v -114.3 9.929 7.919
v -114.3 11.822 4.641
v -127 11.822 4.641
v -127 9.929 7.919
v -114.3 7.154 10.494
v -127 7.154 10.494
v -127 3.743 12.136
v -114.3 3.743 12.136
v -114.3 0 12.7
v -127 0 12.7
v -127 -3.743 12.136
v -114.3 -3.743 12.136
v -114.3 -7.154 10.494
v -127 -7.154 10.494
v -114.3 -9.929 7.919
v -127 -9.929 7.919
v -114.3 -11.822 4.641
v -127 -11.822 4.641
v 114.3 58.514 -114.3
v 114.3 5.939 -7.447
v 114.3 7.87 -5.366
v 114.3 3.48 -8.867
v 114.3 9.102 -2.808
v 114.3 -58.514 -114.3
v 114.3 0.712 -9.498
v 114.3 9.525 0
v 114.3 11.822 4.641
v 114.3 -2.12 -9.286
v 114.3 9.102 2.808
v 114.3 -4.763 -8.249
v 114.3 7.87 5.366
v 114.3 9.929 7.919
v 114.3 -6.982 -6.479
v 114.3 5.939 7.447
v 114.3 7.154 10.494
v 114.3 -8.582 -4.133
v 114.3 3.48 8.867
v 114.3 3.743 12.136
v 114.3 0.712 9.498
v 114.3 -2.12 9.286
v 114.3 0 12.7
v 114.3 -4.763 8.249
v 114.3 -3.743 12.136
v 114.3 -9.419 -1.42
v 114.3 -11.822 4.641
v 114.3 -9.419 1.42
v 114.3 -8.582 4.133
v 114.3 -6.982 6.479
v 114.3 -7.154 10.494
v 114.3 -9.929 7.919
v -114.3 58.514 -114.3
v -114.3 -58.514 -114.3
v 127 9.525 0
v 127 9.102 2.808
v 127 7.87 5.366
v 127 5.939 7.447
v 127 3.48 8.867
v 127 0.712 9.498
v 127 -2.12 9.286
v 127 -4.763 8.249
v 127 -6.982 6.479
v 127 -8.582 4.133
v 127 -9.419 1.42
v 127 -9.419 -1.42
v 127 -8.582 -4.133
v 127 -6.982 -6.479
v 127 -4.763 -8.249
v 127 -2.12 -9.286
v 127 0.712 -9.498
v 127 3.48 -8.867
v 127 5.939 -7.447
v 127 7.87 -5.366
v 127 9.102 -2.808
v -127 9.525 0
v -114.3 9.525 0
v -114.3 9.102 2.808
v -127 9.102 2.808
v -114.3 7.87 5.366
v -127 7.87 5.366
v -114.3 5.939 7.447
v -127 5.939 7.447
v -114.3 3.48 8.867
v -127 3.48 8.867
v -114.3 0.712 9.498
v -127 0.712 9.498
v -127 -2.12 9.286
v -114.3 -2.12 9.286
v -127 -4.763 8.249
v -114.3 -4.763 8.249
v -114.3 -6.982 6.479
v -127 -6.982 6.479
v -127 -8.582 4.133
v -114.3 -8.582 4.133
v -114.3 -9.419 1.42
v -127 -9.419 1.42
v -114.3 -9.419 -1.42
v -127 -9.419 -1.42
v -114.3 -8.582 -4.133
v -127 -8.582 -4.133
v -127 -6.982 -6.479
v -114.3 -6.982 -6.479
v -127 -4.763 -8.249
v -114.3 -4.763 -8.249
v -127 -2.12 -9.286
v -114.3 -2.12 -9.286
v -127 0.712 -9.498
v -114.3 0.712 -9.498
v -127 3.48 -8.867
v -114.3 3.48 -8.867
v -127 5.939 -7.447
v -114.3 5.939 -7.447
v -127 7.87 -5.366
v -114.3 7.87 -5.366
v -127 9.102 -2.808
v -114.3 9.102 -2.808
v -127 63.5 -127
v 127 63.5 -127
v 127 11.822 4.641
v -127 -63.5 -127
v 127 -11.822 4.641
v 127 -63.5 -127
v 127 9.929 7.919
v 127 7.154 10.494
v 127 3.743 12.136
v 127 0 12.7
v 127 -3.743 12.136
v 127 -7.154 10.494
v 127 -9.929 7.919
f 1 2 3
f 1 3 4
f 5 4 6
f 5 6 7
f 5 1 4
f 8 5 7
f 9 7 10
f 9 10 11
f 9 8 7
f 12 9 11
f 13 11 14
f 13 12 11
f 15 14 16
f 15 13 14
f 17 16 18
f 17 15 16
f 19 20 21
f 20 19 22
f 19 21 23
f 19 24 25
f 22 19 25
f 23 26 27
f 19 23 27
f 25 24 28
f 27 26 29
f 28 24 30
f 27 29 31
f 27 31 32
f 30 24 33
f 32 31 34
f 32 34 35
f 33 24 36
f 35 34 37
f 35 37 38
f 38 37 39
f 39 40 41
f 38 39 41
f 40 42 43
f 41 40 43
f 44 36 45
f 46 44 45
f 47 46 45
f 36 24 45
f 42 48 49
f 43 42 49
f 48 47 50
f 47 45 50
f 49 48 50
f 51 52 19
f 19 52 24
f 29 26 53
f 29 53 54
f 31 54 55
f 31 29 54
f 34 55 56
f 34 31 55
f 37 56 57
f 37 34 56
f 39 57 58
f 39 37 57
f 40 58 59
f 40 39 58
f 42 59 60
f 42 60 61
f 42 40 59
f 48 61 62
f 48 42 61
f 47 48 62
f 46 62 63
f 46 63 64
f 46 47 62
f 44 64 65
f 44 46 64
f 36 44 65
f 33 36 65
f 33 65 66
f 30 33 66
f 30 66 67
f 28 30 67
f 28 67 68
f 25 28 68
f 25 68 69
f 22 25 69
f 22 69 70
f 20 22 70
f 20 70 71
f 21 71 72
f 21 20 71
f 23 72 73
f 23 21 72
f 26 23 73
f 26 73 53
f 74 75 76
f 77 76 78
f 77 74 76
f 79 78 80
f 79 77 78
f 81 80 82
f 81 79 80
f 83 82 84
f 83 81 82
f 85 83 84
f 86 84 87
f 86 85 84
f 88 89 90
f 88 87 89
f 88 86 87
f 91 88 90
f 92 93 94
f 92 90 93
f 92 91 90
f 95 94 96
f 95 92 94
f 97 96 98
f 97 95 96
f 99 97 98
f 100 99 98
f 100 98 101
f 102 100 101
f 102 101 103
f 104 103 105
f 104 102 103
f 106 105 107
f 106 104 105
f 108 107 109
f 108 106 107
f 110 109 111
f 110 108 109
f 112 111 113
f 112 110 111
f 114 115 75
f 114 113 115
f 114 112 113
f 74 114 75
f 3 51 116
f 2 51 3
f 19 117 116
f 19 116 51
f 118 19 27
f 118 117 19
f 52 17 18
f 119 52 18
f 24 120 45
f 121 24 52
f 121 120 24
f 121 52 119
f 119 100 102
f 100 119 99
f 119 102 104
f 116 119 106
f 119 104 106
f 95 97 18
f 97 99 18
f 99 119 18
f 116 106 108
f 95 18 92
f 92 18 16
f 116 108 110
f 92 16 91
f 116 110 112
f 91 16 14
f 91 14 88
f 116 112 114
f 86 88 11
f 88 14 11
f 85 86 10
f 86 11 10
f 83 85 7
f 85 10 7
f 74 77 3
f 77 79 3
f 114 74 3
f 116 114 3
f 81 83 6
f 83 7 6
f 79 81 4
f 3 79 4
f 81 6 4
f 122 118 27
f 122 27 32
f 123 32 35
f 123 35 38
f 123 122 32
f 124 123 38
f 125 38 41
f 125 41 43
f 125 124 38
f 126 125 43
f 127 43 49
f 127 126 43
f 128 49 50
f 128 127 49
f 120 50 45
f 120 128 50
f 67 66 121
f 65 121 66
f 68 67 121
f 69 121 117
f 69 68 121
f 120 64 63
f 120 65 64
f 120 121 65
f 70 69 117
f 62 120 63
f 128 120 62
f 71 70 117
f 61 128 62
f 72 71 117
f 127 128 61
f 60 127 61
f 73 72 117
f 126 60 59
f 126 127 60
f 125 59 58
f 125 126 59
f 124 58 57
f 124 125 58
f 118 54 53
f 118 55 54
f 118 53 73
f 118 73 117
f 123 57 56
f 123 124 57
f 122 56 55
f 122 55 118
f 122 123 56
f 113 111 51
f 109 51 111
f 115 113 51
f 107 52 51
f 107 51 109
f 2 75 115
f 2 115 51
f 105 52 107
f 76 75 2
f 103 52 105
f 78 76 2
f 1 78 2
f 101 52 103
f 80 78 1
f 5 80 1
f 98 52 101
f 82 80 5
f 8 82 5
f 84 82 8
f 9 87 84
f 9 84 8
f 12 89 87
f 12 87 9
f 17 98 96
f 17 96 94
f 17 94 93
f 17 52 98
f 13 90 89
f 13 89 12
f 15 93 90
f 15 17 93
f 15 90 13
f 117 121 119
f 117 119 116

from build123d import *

# Parameters (mm, degrees)
F0_R     = 9.525
F1_DEPTH = 127
F2_W     = 228.6
F2_H     = 152.4
F3_DEPTH = 113.538


with BuildPart() as f1:
    # F0 (on Right) → F1 (new body, symmetric)
    with BuildSketch(Plane.YZ):
        with BuildLine():
            ThreePointArc((-11.821697, 4.640849), (-2.361614, -12.478493), (12.7, 0))
            ThreePointArc((12.7, 0), (12.478493, 2.361614), (11.821697, 4.640849))
            ThreePointArc((11.821697, 4.640849), (0, 12.7), (-11.821697, 4.640849))
        make_face()
        Circle(F0_R, mode=Mode.SUBTRACT)
        with BuildLine():
            ThreePointArc((11.821697, 4.640849), (12.478493, 2.361614), (12.7, 0))
            ThreePointArc((12.7, 0), (-2.361614, -12.478493), (-11.821697, 4.640849))
            Line((-11.821697, 4.640849), (-63.5, -127))
            Line((-63.5, -127), (63.5, -127))
            Line((63.5, -127), (11.821697, 4.640849))
        make_face()
    extrude(amount=F1_DEPTH, both=True)

    # F2 (on Front) → F3 (cut, symmetric)
    with BuildSketch(Plane.XZ):
        with Locations((0, -38.1)):
            Rectangle(F2_W, F2_H)
    extrude(amount=F3_DEPTH, both=True, mode=Mode.SUBTRACT)


solid = f1.part
